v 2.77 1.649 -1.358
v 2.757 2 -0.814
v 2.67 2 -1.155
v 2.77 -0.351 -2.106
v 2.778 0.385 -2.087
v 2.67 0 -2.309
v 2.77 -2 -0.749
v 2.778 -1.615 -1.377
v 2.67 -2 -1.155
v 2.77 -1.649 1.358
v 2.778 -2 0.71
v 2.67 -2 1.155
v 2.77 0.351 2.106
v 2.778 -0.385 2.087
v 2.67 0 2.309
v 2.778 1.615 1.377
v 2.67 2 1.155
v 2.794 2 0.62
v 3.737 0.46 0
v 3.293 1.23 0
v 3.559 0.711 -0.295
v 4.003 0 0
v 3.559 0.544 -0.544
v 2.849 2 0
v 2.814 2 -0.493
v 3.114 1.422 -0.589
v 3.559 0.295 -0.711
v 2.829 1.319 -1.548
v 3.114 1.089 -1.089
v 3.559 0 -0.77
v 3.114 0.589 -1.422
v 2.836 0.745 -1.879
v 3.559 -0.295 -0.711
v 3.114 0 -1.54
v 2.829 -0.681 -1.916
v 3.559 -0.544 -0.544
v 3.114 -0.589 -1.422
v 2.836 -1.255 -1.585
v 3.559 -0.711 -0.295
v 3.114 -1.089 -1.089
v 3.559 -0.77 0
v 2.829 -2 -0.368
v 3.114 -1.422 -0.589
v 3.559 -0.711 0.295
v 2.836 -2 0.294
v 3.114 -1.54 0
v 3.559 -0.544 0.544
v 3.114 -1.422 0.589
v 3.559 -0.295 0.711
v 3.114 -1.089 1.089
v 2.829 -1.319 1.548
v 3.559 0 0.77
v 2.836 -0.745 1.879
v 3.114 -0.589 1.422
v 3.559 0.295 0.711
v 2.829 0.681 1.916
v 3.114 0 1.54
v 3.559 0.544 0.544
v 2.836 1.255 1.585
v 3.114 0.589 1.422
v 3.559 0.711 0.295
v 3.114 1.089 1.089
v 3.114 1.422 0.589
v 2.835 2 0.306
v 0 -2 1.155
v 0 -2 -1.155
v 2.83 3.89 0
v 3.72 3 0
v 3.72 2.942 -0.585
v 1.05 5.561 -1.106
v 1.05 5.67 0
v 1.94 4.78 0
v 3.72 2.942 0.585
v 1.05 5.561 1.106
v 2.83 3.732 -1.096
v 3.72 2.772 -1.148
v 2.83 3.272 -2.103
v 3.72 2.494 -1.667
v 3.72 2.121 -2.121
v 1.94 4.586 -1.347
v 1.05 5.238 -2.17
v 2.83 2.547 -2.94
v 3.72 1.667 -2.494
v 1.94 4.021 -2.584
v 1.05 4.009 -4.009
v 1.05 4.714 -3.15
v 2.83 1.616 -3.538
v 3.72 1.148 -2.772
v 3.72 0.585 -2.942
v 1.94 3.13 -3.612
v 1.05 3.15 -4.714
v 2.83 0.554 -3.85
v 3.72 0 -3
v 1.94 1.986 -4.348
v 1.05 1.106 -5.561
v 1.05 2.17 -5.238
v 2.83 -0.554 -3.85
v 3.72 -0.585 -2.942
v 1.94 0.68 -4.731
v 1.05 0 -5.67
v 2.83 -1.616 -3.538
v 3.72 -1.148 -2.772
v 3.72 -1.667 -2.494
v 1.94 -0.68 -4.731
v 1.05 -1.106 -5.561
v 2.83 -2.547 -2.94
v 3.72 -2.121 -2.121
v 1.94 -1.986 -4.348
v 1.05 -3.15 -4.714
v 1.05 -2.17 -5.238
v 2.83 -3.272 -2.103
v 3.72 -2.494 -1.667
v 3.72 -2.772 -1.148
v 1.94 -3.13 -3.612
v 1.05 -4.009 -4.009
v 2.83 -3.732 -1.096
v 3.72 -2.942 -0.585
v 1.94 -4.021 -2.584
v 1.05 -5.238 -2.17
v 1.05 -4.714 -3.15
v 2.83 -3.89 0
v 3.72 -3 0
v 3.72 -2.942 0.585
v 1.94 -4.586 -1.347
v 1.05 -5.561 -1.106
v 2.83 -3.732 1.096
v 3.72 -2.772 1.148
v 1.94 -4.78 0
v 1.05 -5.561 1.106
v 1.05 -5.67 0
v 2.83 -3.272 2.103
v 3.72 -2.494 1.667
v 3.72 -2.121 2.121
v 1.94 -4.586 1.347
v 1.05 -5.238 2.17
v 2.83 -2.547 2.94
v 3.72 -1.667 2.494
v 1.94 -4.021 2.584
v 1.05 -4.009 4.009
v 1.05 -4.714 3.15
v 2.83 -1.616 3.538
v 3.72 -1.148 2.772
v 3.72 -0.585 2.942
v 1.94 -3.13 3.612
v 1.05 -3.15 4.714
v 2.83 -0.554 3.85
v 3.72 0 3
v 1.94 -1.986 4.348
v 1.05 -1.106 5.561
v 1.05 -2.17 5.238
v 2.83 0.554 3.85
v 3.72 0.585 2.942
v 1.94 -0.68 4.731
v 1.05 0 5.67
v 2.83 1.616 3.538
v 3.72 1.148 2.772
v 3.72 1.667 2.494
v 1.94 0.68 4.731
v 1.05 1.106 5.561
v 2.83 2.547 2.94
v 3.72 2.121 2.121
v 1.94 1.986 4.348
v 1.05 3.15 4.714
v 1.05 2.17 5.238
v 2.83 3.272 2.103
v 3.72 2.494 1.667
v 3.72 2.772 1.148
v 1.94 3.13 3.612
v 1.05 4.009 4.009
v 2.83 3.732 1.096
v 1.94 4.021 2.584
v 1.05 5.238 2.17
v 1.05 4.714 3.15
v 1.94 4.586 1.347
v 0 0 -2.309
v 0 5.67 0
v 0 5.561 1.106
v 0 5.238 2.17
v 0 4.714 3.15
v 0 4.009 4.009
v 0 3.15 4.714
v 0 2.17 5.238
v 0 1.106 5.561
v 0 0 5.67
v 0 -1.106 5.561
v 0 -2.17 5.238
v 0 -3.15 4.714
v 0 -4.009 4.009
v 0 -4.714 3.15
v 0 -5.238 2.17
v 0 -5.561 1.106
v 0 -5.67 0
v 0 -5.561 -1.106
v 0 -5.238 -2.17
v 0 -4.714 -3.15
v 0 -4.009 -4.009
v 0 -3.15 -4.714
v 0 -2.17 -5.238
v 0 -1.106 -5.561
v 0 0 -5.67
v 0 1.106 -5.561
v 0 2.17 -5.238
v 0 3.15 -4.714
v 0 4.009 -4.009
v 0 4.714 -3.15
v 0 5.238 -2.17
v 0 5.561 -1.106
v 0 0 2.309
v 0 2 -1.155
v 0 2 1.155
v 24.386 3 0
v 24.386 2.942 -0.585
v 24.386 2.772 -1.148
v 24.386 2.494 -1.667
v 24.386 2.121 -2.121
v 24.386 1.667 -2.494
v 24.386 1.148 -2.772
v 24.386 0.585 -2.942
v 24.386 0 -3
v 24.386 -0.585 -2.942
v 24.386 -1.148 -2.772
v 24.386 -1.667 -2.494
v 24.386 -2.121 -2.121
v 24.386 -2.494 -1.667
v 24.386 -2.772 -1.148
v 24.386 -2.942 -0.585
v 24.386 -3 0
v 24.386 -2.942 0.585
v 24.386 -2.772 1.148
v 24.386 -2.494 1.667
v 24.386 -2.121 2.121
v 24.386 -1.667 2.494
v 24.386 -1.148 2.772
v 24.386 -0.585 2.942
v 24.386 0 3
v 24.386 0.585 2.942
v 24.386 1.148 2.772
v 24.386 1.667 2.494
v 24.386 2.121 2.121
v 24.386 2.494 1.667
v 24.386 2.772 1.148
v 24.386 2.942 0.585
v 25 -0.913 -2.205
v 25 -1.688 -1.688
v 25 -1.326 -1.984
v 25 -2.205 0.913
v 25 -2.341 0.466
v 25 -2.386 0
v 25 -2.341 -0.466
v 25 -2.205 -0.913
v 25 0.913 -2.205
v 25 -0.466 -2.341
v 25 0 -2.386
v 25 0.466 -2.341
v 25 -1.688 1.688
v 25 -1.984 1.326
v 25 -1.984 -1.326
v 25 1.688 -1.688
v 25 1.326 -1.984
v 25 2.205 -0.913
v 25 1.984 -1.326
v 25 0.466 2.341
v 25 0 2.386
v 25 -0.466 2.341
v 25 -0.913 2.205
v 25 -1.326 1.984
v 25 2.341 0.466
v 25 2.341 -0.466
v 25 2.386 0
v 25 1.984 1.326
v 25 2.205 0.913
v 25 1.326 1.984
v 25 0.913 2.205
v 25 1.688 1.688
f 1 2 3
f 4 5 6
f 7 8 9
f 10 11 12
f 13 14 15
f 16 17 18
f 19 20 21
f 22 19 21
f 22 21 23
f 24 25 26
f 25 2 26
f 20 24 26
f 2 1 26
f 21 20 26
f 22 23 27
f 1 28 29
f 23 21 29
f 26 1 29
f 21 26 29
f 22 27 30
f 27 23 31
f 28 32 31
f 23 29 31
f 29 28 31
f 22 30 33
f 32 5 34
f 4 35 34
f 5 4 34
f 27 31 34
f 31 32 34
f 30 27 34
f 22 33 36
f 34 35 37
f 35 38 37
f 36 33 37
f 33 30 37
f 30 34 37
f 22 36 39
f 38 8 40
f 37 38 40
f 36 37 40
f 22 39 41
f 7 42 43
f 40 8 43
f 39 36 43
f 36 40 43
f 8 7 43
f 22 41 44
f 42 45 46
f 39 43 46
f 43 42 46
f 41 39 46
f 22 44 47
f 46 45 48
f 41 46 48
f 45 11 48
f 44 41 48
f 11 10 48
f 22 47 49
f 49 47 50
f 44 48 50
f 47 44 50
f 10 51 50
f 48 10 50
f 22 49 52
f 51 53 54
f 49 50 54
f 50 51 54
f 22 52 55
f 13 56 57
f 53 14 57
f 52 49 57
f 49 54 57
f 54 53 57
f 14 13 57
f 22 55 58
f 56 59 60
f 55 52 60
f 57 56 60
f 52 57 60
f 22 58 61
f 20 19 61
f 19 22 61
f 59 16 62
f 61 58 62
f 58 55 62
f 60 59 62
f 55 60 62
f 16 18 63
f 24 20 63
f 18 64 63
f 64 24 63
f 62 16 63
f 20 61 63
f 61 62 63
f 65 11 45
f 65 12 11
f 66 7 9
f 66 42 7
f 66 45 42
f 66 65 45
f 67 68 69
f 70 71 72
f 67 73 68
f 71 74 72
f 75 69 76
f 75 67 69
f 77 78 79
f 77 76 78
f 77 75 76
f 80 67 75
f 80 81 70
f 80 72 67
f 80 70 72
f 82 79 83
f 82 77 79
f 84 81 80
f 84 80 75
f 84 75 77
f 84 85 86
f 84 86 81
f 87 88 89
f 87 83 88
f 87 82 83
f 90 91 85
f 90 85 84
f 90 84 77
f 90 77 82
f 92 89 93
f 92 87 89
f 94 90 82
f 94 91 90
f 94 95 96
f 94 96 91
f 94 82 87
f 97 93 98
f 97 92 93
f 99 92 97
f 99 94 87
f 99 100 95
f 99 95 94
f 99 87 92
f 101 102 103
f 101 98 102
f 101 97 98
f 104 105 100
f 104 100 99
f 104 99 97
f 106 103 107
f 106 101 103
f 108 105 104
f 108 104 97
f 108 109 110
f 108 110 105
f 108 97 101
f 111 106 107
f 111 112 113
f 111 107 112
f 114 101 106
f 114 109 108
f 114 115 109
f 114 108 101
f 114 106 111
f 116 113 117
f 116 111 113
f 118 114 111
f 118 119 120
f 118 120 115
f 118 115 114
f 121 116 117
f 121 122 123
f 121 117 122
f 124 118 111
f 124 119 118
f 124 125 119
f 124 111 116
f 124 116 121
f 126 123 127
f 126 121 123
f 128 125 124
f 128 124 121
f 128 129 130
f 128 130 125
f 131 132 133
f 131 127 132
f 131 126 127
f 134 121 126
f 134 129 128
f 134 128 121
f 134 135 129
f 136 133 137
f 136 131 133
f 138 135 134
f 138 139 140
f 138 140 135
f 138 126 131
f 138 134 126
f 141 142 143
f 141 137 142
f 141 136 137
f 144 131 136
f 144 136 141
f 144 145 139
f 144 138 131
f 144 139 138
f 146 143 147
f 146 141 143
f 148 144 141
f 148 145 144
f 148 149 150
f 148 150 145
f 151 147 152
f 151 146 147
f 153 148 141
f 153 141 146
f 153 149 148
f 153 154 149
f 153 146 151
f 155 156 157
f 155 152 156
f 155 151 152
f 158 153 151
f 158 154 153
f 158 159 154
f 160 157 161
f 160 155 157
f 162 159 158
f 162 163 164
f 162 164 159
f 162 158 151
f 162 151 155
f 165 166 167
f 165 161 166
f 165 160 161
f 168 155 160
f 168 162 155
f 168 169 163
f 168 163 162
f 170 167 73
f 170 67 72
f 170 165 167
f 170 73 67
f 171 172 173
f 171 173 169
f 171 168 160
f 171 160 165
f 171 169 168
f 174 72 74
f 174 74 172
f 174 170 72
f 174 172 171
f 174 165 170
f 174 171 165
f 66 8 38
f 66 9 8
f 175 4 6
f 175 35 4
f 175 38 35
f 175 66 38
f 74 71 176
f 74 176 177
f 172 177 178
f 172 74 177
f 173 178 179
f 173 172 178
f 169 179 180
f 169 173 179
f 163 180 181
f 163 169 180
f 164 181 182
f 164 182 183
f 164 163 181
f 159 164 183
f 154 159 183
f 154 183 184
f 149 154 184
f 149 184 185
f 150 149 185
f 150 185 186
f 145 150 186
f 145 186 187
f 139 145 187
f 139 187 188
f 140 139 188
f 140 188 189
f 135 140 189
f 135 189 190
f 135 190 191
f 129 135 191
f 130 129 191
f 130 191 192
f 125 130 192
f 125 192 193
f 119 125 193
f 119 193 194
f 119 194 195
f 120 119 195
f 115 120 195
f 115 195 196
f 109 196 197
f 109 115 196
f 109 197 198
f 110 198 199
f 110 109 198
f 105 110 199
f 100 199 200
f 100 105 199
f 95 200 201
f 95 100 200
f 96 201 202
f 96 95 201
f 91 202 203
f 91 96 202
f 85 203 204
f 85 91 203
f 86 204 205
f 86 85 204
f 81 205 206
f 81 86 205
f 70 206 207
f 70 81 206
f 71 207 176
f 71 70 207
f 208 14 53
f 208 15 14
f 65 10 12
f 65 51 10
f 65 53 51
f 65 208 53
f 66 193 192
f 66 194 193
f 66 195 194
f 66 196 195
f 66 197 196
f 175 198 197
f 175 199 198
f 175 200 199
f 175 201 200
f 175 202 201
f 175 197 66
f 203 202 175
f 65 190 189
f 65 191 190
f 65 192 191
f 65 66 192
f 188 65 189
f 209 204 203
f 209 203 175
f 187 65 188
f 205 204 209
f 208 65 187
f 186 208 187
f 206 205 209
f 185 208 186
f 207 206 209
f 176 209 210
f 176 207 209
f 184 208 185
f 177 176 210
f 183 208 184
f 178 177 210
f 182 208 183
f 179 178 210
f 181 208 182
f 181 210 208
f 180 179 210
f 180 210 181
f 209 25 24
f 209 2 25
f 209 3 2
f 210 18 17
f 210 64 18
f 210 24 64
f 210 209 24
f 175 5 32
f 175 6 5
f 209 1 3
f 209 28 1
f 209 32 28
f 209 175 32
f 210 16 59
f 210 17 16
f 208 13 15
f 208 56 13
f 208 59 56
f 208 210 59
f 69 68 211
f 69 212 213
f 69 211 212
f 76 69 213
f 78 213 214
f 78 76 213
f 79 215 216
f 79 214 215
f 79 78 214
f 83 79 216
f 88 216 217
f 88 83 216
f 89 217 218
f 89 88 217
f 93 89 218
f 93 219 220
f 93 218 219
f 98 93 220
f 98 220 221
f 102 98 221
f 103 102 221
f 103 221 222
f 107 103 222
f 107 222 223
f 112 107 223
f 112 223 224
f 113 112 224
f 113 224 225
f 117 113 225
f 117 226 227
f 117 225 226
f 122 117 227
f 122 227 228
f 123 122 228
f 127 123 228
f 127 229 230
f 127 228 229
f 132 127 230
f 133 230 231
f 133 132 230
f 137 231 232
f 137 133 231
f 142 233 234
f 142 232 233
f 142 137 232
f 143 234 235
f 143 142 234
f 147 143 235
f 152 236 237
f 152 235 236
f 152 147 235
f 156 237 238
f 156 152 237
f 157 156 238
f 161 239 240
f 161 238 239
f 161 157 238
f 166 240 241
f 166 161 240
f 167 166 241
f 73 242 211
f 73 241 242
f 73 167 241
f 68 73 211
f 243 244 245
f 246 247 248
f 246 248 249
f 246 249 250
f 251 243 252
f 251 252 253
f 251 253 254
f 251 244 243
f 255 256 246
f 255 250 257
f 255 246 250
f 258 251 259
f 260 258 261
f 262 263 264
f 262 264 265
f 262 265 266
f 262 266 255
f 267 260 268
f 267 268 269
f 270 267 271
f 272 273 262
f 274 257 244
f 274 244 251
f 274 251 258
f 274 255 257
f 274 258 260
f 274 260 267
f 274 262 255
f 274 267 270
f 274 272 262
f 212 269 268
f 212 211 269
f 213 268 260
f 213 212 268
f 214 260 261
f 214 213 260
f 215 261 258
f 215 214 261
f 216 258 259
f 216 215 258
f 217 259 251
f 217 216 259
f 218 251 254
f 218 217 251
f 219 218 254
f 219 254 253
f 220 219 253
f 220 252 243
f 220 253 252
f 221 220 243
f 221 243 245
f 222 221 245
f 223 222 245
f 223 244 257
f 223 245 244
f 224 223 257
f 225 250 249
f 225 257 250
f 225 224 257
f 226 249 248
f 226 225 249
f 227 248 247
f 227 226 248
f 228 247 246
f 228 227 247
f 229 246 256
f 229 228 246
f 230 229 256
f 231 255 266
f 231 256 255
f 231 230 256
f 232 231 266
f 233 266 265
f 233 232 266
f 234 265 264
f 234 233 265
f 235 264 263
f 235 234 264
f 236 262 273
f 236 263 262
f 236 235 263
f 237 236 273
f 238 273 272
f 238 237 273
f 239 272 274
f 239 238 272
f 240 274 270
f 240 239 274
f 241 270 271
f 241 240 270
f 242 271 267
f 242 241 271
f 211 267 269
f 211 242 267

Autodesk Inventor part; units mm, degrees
ref_plane "YZ Plane" through (0, 0, 0) normal (1, 0, 0) x (0, 1, 0)
ref_plane "XZ Plane" through (0, 0, 0) normal (0, 1, 0) x (-1, 0, 0)
sketch "Sketch1" plane through (0, 0, 0) normal (0, 0, 1) x (1, 0, 0)
  line L0 (25, 0) -> (25, 3)
  line L1 (25, 3) -> (7, 3)
  line L2 (7, 3) -> (6.3865, 3)
  line L3 (0, 5.67) -> (0, 2.3094)
  line L4 (0, 2.3094) -> (2.67, 2.3094)
  line L5 (2.67, 2.3094) -> (4.0033, 0)
  line L6 (4.0033, 0) -> (25, 0)
  line L7 (0, 5.67) -> (1.05, 5.67)
  line L8 (1.05, 5.67) -> (3.72, 3)
  line L9 (6.3865, 3) -> (3.72, 3)
  line L10 (7, 3) -> (3.72, 3) construction
  line L11 (3.72, 3) -> (3.72, 3)
  line L12 (-5, 0) -> (30, 0) projected
  line L13 (0, -1.134) -> (0, 6.804) projected
  dimension "d0" = 25
  dimension "d1" = 18
  dimension "d2" = 2.67
  dimension "d3" = 6
  dimension "d6" = 3.72
  dimension "d7" = 45
  dimension "d8" = 4.6188
  dimension "d9" = 60
  dimension "d10" = 11.34
  dimension "d11" = 6
  dimension "d12" = 0.6135
revolve "Body" add sketch "Sketch1" angle 360 about axis through (4.0033, 0, 0) along (1, 0, 0) contours L6 L5 L4 L3 L7 L8 L9 L2 L1 L0
sketch "Sketch2" plane through (0, 0, 0) normal (-1, 0, 0) x (0, 0, 1)
  circle A0 centre (0, 0) radius 2.3094 projected
  line L0 (0, -7.938) -> (0, 7.938) projected
  line L1 (-7.938, 0) -> (7.938, 0) projected
  line L2 (2.3094, 0) -> (1.1547, -2)
  line L3 (1.1547, -2) -> (-1.1547, -2)
  line L4 (-1.1547, -2) -> (-2.3094, 0)
  line L5 (-2.3094, 0) -> (-1.1547, 2)
  line L6 (-1.1547, 2) -> (1.1547, 2)
  line L7 (1.1547, 2) -> (2.3094, 0)
  point P0 (0, 2.3094)
extrude "Slot" add sketch "Sketch2" against normal up to next contours L7 A0 | A0 L2 | L6 L0 A0 | A0 L0 L3 | L0 L6 A0 | A0 L3 L0 | L4 A0 | A0 L5
thread "Thread" size "M6x1" class "6g" standard "ISO Metric profile" length 18
chamfer "Chamfer1" distance 0.6135 distance2 0.6135 1 edges at (25, -3, 0) measured on face at (25, -0.1411, -0.823)
ref_plane "Work Plane1" through (104.775, 0, 0) normal (0, 0, -1) x (1, 0, 0)
equation "\"d15\" = GEL"
equation "\"d17\" = -0.5 * SPD + 0.5 * GD"
equation "\"d18\" = GUL"
equation "\"d0\" = NLG"
equation "\"d1\" = GEL"
equation "\"d2\" = INTI"
equation "\"d3\" = GD"
equation "\"d6\" = KOH"
equation "\"d7\" = 0.5 * SEWI"
equation "\"d8\" = 1.1547 * SW"
equation "\"d10\" = KOD"
equation "\"d11\" = BDM"
equation "\"d12\" = GAL"
equation "\"NLG\" = 25"
equation "\"INTI\" = 2.67"
equation "\"GEL\" = 18"
equation "\"GAL\" = 0.61345 * PTC"
equation "\"KOH\" = 3.72"
equation "\"KOD\" = 11.34"
equation "\"GUL\" = 0.61345 * PTC"
equation "\"SPD\" = NND - 1.2269 * PTC"
equation "\"BDM\" = NND"
equation "\"GD\" = NND"
equation "\"SEWI\" = 90deg"
equation "\"SW\" = 4"
equation "\"TOA\" = 30deg"
equation "\"GD1\" = THREADDIA - 1.2269 * PTC"
equation "\"EPV\" = 6.72"
equation "\"THREADDIA\" = 6"
equation "\"PTC\" = 1"
equation "\"NND\" = 6"
equation "\"E0\" = 4.62"
equation "\"THREADDESC\" = 1.2345"
properties part number "ISO 10642 - M6 x  25" material "Steel"
